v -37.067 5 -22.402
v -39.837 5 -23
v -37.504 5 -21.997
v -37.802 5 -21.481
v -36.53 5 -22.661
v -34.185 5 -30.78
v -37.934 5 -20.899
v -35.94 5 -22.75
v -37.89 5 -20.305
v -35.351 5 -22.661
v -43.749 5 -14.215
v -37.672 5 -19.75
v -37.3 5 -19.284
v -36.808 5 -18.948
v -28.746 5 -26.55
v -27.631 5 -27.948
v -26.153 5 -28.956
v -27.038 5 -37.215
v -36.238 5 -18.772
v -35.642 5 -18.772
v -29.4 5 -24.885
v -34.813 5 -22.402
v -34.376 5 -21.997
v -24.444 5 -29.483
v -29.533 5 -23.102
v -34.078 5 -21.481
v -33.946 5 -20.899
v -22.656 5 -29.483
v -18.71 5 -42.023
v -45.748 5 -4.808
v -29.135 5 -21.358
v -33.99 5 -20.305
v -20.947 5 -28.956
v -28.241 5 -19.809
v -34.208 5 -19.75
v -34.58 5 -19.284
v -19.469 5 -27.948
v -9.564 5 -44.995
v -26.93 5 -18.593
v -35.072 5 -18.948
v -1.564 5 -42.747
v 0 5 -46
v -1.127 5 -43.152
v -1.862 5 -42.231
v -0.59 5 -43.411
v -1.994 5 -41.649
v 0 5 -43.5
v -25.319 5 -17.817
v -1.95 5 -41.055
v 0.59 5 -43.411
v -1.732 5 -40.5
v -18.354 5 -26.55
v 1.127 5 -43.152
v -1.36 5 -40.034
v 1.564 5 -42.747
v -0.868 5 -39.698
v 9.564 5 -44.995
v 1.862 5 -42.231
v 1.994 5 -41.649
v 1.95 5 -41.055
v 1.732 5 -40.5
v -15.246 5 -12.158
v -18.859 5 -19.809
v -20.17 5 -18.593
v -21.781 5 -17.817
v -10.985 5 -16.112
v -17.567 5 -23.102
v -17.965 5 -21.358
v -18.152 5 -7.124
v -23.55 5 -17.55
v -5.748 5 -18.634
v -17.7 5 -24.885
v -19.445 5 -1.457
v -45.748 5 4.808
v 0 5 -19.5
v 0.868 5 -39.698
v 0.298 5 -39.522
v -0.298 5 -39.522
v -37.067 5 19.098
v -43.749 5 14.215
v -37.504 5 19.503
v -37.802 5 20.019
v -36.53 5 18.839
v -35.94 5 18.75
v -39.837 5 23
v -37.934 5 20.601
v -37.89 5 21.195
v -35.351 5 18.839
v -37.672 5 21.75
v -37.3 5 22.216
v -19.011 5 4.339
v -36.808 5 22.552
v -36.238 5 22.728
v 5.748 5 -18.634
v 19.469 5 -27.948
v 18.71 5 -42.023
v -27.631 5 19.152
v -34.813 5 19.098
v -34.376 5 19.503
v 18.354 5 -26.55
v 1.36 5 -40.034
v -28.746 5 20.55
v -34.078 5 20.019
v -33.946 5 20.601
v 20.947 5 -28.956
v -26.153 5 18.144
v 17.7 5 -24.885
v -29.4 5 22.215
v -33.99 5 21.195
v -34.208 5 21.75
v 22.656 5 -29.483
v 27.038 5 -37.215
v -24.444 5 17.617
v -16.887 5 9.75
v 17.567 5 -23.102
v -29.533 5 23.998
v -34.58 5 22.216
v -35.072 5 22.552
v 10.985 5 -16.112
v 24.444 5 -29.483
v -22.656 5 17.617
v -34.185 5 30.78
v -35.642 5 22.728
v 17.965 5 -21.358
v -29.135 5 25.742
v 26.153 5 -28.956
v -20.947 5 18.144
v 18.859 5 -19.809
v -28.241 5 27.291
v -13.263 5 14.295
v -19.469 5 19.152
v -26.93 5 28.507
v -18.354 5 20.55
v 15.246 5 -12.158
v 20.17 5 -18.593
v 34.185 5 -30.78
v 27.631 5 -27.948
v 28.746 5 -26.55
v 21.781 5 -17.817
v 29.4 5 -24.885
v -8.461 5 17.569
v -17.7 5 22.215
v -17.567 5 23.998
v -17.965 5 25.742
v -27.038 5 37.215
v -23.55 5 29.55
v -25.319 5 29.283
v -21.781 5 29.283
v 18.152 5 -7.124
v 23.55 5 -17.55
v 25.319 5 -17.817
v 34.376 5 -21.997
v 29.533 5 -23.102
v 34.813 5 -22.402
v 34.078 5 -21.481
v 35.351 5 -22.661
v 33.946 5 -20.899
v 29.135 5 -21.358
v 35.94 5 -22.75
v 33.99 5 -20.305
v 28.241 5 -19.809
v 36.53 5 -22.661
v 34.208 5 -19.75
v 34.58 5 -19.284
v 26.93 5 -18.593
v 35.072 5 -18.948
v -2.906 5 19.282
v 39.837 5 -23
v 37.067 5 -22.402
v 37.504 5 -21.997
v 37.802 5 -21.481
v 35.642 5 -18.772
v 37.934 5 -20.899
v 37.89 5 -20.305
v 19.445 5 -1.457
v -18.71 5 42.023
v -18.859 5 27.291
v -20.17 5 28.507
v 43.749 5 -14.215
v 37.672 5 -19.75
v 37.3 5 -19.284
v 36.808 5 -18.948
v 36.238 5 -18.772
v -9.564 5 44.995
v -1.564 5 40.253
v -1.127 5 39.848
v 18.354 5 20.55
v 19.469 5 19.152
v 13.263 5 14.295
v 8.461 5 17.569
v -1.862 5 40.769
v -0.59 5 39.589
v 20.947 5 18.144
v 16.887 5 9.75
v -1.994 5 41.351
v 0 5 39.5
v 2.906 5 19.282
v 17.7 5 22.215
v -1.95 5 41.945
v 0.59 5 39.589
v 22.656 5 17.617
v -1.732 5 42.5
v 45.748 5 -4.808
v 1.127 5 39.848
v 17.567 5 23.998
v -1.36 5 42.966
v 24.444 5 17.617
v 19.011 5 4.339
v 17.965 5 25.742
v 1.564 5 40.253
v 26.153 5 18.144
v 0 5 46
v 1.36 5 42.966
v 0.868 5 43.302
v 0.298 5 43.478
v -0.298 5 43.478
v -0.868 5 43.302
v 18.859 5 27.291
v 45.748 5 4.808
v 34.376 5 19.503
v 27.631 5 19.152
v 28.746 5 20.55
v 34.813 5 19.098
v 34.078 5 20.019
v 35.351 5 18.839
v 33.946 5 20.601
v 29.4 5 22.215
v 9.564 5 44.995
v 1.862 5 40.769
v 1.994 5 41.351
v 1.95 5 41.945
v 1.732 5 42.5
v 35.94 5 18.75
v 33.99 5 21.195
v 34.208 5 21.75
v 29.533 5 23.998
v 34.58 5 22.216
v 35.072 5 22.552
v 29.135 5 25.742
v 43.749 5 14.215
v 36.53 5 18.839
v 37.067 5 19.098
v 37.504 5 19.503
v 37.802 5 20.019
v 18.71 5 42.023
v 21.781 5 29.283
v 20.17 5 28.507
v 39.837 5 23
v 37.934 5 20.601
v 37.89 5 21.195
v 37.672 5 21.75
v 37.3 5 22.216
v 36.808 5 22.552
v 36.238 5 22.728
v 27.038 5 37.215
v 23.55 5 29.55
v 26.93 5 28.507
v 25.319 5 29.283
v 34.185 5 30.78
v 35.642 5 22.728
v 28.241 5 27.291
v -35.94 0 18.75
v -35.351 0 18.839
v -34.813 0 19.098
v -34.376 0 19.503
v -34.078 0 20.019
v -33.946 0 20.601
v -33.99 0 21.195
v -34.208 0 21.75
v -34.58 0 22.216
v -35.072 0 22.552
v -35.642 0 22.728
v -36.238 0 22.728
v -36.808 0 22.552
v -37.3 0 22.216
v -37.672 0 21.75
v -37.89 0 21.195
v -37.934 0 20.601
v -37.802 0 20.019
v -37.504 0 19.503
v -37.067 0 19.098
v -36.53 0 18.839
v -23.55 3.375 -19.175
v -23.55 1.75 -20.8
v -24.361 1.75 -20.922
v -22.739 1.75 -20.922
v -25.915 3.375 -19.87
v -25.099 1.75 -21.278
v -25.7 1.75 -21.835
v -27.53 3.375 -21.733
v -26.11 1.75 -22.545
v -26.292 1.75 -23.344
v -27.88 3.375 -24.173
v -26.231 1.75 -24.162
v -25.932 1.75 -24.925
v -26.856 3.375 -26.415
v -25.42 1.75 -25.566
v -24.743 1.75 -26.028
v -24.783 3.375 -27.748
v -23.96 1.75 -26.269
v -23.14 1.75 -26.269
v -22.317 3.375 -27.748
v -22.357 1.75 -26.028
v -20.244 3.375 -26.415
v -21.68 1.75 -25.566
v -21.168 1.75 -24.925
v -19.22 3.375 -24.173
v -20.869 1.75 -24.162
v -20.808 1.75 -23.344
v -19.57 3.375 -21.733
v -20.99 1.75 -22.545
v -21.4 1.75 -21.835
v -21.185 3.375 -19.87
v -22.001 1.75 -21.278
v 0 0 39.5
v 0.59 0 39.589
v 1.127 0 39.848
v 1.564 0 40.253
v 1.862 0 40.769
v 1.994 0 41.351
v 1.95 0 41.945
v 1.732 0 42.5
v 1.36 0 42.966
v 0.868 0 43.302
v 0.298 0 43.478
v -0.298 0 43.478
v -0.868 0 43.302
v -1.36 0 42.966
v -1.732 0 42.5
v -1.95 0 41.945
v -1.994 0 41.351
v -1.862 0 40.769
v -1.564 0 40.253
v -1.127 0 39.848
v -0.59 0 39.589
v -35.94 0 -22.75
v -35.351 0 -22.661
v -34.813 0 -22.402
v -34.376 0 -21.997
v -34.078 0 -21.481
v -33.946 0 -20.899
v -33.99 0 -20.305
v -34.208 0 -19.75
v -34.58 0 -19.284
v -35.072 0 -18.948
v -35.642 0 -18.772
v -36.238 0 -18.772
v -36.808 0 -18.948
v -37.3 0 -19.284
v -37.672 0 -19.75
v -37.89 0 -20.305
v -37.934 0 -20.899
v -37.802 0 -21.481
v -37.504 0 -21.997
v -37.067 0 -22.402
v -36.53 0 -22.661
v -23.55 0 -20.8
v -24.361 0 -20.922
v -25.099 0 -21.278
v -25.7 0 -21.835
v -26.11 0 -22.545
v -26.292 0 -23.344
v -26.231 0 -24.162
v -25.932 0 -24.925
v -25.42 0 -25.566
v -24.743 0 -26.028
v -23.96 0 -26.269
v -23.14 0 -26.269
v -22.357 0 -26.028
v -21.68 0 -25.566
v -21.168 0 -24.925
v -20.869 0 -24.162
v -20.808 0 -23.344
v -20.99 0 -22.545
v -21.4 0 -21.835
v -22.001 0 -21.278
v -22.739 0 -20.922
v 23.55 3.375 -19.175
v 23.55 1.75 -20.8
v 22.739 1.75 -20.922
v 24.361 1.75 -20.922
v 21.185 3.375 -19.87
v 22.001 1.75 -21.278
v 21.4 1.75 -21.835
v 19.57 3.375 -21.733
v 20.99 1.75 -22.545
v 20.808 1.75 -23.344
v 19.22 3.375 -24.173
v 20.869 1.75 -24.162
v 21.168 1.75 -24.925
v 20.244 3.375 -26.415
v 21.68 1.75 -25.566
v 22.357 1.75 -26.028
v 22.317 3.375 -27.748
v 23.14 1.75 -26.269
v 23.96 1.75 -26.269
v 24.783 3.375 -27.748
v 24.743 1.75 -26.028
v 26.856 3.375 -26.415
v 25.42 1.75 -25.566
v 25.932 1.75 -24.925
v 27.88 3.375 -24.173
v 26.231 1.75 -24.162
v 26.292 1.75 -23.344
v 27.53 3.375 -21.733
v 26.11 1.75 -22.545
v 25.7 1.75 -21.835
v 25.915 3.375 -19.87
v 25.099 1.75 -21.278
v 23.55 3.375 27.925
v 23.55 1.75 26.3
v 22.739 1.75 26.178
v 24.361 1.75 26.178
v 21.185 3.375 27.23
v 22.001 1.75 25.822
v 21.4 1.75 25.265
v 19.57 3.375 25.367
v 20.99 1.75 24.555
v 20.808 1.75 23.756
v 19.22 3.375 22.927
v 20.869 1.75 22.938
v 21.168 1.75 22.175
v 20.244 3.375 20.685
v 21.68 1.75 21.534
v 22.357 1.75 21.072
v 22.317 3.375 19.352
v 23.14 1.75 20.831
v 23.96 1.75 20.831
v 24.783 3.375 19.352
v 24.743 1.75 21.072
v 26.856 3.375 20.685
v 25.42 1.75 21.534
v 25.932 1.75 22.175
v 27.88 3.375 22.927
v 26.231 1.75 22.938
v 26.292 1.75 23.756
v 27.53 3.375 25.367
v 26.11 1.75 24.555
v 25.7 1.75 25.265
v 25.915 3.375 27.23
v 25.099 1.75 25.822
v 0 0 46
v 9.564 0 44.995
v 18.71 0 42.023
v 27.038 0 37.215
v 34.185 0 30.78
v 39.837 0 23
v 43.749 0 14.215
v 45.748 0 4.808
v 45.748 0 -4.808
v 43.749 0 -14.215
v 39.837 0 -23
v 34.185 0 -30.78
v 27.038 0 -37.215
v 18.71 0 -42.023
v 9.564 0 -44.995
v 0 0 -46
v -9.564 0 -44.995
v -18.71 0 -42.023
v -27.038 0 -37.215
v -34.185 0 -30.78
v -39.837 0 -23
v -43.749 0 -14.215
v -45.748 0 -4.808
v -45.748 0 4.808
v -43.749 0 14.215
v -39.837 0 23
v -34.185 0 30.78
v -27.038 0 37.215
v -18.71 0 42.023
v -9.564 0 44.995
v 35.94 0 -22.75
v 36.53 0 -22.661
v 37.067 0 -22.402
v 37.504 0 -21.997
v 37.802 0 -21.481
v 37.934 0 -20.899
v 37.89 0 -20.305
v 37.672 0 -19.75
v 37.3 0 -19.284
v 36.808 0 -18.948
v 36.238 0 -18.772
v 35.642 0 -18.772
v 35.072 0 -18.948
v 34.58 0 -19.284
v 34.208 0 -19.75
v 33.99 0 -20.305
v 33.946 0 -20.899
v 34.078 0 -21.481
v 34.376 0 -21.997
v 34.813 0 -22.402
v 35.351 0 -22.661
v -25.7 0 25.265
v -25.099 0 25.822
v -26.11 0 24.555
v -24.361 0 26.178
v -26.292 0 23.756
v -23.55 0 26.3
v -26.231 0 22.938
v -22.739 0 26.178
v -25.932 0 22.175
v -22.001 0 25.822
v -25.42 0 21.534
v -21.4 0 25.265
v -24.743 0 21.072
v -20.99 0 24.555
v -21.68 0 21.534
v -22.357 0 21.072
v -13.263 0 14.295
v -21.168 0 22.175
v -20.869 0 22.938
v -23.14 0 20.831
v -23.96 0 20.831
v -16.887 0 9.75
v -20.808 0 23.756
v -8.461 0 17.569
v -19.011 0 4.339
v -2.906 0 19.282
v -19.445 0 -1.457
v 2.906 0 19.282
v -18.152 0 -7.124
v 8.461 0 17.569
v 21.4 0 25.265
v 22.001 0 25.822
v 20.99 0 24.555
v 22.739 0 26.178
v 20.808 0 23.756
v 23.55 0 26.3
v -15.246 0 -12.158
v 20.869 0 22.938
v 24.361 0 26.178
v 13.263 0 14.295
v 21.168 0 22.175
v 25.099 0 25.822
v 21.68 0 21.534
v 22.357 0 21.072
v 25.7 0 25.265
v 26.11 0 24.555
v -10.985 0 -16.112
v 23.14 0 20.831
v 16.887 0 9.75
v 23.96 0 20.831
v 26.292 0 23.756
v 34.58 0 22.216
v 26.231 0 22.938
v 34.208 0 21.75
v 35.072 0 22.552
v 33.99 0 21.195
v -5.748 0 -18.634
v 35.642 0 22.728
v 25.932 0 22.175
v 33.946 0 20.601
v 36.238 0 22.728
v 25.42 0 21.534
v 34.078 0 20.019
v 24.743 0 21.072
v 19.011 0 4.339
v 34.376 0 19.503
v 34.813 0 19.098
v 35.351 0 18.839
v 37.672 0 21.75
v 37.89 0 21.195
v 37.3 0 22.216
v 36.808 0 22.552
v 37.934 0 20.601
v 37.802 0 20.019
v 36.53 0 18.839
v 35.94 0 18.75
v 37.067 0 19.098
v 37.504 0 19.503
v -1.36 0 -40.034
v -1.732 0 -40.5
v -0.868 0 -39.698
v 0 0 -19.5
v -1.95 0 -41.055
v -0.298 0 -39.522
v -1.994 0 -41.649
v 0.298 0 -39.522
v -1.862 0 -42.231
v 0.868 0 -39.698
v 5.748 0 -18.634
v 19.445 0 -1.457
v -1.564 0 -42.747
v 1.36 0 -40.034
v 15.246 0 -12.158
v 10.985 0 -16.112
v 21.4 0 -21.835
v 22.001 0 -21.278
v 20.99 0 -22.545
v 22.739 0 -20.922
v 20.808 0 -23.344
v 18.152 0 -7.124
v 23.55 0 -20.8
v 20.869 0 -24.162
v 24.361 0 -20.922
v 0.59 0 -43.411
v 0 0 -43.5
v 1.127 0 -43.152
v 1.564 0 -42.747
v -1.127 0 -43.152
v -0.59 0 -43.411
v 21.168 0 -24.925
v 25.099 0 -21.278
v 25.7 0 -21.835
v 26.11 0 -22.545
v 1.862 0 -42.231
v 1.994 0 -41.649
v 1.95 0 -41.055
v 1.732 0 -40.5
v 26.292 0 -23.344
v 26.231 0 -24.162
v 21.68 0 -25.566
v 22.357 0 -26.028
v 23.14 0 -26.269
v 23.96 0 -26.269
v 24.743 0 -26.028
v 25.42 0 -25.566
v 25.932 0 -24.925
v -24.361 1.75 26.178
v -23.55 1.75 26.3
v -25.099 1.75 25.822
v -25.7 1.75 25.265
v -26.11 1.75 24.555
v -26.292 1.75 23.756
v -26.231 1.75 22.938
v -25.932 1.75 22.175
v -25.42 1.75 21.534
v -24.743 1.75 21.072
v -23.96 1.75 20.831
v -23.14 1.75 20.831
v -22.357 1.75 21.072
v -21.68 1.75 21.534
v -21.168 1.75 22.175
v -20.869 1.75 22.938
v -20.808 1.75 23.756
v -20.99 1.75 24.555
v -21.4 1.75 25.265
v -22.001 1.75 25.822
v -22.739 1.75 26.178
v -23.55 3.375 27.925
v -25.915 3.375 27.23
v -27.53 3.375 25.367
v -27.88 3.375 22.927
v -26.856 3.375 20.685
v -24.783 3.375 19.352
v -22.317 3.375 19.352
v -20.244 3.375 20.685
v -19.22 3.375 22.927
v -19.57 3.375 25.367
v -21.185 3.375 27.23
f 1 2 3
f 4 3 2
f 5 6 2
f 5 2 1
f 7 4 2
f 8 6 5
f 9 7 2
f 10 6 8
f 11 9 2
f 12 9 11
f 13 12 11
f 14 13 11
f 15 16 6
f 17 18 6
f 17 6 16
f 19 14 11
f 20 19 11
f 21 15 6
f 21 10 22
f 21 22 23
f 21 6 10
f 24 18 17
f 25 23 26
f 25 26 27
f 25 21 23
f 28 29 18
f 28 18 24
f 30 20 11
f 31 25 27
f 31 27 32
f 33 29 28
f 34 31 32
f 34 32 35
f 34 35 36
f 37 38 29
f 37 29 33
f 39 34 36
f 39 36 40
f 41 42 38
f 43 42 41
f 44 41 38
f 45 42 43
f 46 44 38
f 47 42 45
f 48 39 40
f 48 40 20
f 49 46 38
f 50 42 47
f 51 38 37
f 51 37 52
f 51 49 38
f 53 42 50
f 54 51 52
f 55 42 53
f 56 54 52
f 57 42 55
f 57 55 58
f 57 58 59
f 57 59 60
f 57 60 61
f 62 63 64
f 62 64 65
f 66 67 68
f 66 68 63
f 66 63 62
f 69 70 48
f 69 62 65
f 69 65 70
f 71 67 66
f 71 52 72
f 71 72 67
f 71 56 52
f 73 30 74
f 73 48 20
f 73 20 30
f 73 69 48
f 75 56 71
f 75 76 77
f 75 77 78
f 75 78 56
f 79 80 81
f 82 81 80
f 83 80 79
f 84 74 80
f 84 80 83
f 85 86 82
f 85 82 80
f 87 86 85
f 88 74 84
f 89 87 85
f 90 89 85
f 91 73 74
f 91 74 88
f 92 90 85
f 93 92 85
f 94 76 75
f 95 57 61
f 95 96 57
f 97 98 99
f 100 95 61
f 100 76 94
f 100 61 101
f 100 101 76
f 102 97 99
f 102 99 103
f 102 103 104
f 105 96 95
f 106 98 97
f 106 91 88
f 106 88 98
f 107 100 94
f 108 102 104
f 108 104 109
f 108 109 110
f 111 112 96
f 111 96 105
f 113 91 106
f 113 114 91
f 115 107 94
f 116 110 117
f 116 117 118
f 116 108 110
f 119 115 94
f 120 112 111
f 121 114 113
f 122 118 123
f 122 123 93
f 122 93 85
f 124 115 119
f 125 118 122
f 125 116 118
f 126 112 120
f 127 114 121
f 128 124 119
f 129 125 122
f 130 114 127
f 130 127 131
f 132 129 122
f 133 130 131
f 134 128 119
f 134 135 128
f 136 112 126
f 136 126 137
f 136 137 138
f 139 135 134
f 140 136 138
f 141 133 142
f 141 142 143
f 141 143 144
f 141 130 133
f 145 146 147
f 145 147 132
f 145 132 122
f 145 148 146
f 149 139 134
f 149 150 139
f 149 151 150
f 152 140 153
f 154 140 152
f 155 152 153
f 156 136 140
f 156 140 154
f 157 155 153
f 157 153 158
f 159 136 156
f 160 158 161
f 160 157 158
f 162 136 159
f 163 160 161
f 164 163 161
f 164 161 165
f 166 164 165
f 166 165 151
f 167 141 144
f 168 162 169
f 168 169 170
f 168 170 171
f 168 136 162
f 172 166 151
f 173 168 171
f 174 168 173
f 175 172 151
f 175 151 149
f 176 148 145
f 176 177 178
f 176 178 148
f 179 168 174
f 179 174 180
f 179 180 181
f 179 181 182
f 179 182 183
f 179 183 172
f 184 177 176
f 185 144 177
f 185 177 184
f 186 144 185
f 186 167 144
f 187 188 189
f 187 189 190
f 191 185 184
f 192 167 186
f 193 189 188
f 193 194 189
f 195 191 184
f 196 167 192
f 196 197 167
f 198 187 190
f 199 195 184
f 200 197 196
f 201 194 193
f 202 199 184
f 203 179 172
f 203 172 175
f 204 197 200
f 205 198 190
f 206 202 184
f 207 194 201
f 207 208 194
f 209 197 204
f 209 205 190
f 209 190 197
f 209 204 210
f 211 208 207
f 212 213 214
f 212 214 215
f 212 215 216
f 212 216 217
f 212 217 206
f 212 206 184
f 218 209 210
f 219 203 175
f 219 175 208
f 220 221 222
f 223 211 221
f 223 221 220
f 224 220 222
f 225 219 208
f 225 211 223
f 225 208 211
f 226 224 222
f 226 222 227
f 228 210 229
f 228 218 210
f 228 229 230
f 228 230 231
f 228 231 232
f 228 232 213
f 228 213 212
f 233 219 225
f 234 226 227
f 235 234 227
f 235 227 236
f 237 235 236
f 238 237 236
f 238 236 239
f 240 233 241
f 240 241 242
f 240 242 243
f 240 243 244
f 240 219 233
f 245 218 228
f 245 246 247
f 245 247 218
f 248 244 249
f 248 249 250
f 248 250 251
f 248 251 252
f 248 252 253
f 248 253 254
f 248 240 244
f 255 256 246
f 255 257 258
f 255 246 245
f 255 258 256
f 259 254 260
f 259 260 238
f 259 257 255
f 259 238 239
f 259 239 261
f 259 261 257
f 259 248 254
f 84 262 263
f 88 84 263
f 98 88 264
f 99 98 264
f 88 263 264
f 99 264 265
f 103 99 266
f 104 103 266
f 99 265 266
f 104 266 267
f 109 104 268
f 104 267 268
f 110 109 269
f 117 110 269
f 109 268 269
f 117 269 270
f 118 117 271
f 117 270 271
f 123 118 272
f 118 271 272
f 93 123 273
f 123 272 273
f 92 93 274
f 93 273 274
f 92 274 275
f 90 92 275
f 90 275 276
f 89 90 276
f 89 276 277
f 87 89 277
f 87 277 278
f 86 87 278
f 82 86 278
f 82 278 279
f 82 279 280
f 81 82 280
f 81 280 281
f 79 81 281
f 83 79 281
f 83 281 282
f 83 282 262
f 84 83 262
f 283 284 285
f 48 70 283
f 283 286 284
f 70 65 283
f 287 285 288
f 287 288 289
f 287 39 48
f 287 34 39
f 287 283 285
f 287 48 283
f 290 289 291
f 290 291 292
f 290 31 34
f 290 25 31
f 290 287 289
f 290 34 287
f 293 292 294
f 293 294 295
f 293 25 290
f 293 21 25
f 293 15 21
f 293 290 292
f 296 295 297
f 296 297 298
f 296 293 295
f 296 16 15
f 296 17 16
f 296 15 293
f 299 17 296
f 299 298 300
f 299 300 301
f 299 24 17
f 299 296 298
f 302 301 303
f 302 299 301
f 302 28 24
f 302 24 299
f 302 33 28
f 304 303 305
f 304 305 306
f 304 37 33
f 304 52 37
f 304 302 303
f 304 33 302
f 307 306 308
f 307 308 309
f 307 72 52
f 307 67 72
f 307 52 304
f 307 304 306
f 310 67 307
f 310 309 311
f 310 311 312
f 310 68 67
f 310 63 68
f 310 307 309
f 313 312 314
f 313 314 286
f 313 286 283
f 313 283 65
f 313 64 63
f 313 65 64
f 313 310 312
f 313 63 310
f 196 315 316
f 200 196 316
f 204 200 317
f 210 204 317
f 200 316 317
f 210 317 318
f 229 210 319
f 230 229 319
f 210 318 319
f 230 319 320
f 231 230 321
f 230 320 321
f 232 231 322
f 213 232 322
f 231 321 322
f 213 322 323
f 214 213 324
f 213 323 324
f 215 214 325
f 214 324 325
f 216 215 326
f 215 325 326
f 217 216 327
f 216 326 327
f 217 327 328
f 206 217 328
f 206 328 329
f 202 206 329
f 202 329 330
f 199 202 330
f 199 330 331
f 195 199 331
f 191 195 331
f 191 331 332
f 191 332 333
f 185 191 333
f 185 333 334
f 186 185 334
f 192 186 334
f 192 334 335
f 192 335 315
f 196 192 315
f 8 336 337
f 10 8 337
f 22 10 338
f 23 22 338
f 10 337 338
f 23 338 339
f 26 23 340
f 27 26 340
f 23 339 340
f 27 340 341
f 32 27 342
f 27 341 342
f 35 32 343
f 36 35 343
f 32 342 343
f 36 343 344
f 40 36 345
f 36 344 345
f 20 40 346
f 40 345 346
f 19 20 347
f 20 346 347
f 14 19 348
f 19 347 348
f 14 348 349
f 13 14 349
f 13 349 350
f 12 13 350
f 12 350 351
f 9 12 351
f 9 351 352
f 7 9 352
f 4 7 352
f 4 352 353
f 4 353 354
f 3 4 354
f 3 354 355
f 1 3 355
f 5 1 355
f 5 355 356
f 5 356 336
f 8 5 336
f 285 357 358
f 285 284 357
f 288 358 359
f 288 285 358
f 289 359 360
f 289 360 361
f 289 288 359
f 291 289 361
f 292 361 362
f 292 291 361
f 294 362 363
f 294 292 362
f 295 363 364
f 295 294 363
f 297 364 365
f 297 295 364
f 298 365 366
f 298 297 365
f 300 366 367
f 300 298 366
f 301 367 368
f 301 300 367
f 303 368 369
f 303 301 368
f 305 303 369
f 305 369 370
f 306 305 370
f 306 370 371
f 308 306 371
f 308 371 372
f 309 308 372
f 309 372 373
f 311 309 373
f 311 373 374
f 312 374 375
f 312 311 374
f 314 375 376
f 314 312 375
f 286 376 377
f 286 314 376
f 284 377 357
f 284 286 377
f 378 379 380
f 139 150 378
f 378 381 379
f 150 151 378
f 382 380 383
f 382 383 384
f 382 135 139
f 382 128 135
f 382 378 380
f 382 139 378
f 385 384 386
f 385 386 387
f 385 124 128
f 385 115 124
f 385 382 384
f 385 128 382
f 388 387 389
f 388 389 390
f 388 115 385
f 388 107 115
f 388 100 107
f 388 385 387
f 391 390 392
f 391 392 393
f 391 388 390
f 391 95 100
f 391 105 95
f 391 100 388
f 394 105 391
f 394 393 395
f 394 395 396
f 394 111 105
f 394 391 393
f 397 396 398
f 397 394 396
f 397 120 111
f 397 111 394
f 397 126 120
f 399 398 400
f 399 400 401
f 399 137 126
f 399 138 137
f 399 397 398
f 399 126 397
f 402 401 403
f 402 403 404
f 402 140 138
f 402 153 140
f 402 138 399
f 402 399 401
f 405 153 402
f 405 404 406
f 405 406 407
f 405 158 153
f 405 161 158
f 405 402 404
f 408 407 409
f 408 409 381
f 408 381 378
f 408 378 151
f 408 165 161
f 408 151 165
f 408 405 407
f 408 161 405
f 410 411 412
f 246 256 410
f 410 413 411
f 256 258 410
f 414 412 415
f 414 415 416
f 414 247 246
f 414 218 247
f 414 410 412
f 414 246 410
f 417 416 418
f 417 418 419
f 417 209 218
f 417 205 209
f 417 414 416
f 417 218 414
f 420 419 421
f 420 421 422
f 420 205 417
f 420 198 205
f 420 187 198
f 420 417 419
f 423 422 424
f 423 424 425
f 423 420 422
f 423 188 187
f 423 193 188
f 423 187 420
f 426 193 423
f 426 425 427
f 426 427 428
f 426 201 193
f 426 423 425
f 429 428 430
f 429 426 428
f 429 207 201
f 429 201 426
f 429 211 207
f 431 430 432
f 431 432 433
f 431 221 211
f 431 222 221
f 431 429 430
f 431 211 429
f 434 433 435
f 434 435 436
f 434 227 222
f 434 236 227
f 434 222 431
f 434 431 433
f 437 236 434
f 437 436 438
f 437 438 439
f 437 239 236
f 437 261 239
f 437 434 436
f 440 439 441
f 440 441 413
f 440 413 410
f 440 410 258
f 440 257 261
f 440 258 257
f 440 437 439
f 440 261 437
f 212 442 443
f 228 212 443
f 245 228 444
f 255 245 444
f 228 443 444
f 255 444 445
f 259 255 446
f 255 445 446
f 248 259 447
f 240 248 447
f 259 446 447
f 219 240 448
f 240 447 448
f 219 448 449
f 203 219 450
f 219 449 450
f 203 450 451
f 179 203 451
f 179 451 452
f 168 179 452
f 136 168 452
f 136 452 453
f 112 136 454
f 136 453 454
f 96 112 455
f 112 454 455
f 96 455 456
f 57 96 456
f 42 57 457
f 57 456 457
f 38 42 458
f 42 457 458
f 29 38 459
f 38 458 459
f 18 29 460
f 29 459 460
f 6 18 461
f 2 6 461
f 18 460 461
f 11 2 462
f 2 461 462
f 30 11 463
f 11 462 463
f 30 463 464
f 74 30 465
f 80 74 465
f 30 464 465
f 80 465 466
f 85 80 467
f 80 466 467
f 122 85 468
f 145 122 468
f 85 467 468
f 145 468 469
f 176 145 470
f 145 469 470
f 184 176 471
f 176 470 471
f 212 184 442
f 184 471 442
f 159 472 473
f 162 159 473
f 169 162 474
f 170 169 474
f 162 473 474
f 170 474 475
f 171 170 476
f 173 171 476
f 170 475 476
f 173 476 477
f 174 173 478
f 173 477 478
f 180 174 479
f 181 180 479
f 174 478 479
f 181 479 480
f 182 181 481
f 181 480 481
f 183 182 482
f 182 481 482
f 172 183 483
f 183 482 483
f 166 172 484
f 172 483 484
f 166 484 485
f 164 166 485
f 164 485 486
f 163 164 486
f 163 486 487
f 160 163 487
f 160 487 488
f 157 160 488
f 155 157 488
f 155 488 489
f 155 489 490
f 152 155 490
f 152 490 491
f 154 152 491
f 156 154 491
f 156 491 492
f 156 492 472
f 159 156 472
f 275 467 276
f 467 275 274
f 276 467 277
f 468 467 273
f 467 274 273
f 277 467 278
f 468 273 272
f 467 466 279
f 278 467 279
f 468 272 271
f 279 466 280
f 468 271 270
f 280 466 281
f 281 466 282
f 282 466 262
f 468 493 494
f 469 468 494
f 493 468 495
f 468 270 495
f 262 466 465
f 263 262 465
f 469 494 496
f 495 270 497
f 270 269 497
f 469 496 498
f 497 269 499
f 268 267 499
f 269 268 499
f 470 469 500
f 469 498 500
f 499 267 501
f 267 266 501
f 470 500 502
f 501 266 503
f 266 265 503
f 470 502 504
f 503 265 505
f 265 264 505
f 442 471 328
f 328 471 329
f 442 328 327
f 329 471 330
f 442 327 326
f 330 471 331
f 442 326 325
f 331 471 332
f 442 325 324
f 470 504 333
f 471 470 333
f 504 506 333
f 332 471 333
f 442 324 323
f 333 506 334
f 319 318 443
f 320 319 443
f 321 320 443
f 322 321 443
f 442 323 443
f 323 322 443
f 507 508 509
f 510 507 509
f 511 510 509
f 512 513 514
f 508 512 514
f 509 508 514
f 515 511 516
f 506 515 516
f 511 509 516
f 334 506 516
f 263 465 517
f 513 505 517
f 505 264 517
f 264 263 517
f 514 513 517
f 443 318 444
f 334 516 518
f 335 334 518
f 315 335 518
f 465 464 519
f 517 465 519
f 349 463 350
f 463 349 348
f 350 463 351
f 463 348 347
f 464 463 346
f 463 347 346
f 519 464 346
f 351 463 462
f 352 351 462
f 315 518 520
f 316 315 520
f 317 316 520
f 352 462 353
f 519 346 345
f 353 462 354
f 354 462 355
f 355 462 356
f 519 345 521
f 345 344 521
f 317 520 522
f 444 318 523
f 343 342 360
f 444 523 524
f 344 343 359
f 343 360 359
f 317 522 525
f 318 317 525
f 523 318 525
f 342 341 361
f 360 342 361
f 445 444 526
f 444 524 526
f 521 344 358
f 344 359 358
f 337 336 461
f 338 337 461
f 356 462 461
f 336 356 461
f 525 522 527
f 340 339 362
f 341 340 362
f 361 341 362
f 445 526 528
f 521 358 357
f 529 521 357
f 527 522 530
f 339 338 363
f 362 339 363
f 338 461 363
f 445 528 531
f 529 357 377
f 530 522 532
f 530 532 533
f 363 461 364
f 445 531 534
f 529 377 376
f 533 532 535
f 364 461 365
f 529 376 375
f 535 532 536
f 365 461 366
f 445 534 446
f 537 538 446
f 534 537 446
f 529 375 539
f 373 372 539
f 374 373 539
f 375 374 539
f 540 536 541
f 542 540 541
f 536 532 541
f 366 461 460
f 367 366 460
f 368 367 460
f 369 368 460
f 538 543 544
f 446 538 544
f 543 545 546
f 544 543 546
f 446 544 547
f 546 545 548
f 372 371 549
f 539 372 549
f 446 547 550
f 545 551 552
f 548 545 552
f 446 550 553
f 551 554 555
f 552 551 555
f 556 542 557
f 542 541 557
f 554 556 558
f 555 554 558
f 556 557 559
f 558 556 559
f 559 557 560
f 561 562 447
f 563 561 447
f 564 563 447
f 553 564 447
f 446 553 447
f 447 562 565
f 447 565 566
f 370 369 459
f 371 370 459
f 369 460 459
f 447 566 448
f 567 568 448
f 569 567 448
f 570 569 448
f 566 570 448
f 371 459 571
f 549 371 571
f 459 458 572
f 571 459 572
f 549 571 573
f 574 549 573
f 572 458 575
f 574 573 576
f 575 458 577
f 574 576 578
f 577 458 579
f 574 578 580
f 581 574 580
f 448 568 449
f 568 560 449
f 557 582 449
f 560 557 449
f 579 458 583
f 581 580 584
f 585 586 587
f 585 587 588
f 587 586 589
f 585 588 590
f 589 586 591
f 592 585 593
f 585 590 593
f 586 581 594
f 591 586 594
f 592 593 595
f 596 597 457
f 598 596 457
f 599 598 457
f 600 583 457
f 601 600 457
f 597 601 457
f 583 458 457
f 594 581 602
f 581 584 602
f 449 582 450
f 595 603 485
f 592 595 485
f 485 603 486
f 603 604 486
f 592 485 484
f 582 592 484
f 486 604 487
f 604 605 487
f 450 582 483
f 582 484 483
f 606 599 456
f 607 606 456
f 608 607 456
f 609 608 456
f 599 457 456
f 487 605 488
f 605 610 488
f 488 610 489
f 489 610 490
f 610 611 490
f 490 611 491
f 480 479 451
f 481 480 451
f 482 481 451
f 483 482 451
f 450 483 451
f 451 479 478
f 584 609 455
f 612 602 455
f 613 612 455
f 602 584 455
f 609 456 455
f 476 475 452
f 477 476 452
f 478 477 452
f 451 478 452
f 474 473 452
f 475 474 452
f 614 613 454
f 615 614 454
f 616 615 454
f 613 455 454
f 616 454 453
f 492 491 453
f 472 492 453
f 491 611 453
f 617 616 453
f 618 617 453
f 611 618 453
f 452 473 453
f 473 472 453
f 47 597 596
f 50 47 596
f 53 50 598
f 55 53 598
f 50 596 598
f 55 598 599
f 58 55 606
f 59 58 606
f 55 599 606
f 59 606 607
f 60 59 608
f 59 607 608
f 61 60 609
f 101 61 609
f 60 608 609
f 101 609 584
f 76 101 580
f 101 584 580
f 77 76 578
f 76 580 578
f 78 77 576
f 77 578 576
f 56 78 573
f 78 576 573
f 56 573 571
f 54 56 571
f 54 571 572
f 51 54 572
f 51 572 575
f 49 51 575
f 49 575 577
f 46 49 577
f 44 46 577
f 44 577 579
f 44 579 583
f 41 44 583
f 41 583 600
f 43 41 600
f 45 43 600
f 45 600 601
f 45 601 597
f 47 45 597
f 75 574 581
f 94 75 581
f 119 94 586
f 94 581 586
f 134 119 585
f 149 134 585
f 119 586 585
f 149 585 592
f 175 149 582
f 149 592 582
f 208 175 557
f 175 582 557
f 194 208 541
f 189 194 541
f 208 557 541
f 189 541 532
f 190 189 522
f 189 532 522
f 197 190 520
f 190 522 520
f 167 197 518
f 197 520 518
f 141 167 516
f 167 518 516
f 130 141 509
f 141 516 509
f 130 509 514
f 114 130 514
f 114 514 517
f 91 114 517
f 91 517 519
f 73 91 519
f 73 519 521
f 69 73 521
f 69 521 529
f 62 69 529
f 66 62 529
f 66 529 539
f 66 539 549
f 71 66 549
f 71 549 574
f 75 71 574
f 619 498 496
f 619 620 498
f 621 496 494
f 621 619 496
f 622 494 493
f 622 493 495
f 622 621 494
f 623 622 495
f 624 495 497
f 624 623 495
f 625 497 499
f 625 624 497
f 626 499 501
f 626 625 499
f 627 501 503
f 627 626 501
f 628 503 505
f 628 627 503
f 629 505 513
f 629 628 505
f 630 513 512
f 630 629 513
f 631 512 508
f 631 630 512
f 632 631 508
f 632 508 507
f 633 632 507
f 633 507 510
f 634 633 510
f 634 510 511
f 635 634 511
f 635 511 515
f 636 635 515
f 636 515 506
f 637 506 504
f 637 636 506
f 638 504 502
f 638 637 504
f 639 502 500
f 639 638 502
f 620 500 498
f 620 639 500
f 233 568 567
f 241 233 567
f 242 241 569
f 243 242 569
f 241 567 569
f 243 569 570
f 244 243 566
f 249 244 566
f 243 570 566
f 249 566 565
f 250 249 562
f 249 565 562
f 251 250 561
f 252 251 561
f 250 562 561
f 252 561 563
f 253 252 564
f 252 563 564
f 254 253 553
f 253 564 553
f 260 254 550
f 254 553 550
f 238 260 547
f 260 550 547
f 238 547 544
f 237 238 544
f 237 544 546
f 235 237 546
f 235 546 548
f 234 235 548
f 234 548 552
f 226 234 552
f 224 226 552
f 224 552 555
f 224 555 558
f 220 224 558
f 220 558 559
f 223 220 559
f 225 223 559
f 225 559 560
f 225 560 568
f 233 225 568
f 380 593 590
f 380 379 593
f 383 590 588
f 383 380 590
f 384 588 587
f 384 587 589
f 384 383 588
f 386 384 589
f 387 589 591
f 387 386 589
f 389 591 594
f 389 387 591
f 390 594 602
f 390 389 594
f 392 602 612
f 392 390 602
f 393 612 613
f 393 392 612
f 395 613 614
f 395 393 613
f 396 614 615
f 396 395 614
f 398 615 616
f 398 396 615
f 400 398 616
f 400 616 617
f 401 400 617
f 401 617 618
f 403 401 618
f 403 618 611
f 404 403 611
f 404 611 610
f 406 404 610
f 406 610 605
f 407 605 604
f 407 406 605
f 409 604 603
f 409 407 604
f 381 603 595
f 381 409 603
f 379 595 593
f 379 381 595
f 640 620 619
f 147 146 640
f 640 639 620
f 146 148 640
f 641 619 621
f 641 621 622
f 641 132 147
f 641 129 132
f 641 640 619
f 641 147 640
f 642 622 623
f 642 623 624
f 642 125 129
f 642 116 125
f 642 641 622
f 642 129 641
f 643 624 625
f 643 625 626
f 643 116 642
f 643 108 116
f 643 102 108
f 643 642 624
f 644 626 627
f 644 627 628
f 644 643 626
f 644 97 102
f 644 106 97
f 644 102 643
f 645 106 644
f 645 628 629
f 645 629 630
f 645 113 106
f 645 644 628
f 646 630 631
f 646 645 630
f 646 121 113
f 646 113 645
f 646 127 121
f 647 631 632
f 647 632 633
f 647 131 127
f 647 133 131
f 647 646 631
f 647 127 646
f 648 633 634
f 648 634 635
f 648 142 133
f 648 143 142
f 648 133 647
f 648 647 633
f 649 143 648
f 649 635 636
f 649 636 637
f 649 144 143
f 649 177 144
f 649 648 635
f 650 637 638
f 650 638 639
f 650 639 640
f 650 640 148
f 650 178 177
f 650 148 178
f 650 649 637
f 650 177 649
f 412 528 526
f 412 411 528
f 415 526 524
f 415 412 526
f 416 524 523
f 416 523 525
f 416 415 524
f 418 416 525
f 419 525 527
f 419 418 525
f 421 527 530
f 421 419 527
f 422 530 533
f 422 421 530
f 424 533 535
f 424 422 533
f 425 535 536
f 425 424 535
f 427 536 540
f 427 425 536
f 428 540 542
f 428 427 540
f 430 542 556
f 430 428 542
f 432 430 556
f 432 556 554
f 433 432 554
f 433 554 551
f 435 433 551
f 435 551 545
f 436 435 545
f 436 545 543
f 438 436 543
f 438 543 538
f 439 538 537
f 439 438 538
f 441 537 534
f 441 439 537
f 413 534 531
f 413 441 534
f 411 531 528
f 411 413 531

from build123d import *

# Parameters (mm, degrees)
SKETCH1_R                                    = 46
SKETCH1_R_2                                  = 2.5
BOSS_EXTRUDE1_DEPTH                          = 5
SKETCH3_R                                    = 2
CUT_EXTRUDE2_DEPTH                           = 66.245689513
SKETCH7_R                                    = 19.5
CUT_EXTRUDE3_DEPTH                           = 66.245689513
CSK_FOR_M5_SOCKET_COUNTERSUNK_HEAD_S_2_COUNT = 2
CSK_FOR_M5_SOCKET_COUNTERSUNK_HEAD_S_2_PITCH = 47.1
CSK_FOR_M5_SOCKET_COUNTERSUNK_HEAD_S_3_COUNT = 2
CSK_FOR_M5_SOCKET_COUNTERSUNK_HEAD_S_3_PITCH = 66.609458788
CSK_FOR_M5_SOCKET_COUNTERSUNK_HEAD_S_4_COUNT = 2
CSK_FOR_M5_SOCKET_COUNTERSUNK_HEAD_S_4_PITCH = 47.1


with BuildPart() as part:
    # Sketch1 → Boss-Extrude1 (new body)
    with BuildSketch(Plane(origin=(0, 0, 0), x_dir=(1, 0, 0), z_dir=(0, 1, 0))):
        Circle(SKETCH1_R)
        with Locations((-23.55, -23.55)):
            Circle(SKETCH1_R_2, mode=Mode.SUBTRACT)
        with Locations((23.55, -23.55)):
            Circle(SKETCH1_R_2, mode=Mode.SUBTRACT)
        with Locations((-23.55, 23.55)):
            Circle(SKETCH1_R_2, mode=Mode.SUBTRACT)
        with Locations((23.55, 23.55)):
            Circle(SKETCH1_R_2, mode=Mode.SUBTRACT)
    extrude(amount=BOSS_EXTRUDE1_DEPTH)

    # Sketch3 → Cut-Extrude2 (cut, through all)
    with BuildSketch(Plane.XZ):
        with Locations((0, 41.5)):
            Circle(SKETCH3_R)
        with Locations((35.940054257, 20.75)):
            Circle(SKETCH3_R)
        with Locations((35.940054257, -20.75)):
            Circle(SKETCH3_R)
        with Locations((0, -41.5)):
            Circle(SKETCH3_R)
        with Locations((-35.940054257, -20.75)):
            Circle(SKETCH3_R)
        with Locations((-35.940054257, 20.75)):
            Circle(SKETCH3_R)
    extrude(amount=-CUT_EXTRUDE2_DEPTH, mode=Mode.SUBTRACT)

    # Sketch7 → Cut-Extrude3 (cut, through all)
    with BuildSketch(Plane.XZ):
        Circle(SKETCH7_R)
    extrude(amount=-CUT_EXTRUDE3_DEPTH, mode=Mode.SUBTRACT)

    # Sketch8 → CSK for M5 socket countersunk head screw1 (revolve, cut)
    with BuildSketch(Plane(origin=(23.55, 5, -23.55), x_dir=(0, 0, 1), z_dir=(1, 0, 0))):
        Polygon((0, 0), (0, 5), (2.75, 5), (2.75, 3.25), (6, 0), align=None)
    csk_for_m5_socket_countersunk_head_screw = revolve(axis=Axis((23.55, 11.35, -23.55), (0, -1, 0)), mode=Mode.SUBTRACT)

    # CSK for M5 socket countersunk head s 2: CSK for M5 socket countersunk head screw1 ×2
    with Locations(*[(0, 0, i * CSK_FOR_M5_SOCKET_COUNTERSUNK_HEAD_S_2_PITCH) for i in range(1, CSK_FOR_M5_SOCKET_COUNTERSUNK_HEAD_S_2_COUNT)]):
        add(csk_for_m5_socket_countersunk_head_screw, mode=Mode.SUBTRACT)

    # CSK for M5 socket countersunk head s 3: CSK for M5 socket countersunk head screw1 ×2
    with Locations(*[Vector(-0.7071067811865476, 0, 0.7071067811865476) * (i * CSK_FOR_M5_SOCKET_COUNTERSUNK_HEAD_S_3_PITCH) for i in range(1, CSK_FOR_M5_SOCKET_COUNTERSUNK_HEAD_S_3_COUNT)]):
        add(csk_for_m5_socket_countersunk_head_screw, mode=Mode.SUBTRACT)

    # CSK for M5 socket countersunk head s 4: CSK for M5 socket countersunk head screw1 ×2
    with Locations(*[(-i * CSK_FOR_M5_SOCKET_COUNTERSUNK_HEAD_S_4_PITCH, 0, 0) for i in range(1, CSK_FOR_M5_SOCKET_COUNTERSUNK_HEAD_S_4_COUNT)]):
        add(csk_for_m5_socket_countersunk_head_screw, mode=Mode.SUBTRACT)


solid = part.part
